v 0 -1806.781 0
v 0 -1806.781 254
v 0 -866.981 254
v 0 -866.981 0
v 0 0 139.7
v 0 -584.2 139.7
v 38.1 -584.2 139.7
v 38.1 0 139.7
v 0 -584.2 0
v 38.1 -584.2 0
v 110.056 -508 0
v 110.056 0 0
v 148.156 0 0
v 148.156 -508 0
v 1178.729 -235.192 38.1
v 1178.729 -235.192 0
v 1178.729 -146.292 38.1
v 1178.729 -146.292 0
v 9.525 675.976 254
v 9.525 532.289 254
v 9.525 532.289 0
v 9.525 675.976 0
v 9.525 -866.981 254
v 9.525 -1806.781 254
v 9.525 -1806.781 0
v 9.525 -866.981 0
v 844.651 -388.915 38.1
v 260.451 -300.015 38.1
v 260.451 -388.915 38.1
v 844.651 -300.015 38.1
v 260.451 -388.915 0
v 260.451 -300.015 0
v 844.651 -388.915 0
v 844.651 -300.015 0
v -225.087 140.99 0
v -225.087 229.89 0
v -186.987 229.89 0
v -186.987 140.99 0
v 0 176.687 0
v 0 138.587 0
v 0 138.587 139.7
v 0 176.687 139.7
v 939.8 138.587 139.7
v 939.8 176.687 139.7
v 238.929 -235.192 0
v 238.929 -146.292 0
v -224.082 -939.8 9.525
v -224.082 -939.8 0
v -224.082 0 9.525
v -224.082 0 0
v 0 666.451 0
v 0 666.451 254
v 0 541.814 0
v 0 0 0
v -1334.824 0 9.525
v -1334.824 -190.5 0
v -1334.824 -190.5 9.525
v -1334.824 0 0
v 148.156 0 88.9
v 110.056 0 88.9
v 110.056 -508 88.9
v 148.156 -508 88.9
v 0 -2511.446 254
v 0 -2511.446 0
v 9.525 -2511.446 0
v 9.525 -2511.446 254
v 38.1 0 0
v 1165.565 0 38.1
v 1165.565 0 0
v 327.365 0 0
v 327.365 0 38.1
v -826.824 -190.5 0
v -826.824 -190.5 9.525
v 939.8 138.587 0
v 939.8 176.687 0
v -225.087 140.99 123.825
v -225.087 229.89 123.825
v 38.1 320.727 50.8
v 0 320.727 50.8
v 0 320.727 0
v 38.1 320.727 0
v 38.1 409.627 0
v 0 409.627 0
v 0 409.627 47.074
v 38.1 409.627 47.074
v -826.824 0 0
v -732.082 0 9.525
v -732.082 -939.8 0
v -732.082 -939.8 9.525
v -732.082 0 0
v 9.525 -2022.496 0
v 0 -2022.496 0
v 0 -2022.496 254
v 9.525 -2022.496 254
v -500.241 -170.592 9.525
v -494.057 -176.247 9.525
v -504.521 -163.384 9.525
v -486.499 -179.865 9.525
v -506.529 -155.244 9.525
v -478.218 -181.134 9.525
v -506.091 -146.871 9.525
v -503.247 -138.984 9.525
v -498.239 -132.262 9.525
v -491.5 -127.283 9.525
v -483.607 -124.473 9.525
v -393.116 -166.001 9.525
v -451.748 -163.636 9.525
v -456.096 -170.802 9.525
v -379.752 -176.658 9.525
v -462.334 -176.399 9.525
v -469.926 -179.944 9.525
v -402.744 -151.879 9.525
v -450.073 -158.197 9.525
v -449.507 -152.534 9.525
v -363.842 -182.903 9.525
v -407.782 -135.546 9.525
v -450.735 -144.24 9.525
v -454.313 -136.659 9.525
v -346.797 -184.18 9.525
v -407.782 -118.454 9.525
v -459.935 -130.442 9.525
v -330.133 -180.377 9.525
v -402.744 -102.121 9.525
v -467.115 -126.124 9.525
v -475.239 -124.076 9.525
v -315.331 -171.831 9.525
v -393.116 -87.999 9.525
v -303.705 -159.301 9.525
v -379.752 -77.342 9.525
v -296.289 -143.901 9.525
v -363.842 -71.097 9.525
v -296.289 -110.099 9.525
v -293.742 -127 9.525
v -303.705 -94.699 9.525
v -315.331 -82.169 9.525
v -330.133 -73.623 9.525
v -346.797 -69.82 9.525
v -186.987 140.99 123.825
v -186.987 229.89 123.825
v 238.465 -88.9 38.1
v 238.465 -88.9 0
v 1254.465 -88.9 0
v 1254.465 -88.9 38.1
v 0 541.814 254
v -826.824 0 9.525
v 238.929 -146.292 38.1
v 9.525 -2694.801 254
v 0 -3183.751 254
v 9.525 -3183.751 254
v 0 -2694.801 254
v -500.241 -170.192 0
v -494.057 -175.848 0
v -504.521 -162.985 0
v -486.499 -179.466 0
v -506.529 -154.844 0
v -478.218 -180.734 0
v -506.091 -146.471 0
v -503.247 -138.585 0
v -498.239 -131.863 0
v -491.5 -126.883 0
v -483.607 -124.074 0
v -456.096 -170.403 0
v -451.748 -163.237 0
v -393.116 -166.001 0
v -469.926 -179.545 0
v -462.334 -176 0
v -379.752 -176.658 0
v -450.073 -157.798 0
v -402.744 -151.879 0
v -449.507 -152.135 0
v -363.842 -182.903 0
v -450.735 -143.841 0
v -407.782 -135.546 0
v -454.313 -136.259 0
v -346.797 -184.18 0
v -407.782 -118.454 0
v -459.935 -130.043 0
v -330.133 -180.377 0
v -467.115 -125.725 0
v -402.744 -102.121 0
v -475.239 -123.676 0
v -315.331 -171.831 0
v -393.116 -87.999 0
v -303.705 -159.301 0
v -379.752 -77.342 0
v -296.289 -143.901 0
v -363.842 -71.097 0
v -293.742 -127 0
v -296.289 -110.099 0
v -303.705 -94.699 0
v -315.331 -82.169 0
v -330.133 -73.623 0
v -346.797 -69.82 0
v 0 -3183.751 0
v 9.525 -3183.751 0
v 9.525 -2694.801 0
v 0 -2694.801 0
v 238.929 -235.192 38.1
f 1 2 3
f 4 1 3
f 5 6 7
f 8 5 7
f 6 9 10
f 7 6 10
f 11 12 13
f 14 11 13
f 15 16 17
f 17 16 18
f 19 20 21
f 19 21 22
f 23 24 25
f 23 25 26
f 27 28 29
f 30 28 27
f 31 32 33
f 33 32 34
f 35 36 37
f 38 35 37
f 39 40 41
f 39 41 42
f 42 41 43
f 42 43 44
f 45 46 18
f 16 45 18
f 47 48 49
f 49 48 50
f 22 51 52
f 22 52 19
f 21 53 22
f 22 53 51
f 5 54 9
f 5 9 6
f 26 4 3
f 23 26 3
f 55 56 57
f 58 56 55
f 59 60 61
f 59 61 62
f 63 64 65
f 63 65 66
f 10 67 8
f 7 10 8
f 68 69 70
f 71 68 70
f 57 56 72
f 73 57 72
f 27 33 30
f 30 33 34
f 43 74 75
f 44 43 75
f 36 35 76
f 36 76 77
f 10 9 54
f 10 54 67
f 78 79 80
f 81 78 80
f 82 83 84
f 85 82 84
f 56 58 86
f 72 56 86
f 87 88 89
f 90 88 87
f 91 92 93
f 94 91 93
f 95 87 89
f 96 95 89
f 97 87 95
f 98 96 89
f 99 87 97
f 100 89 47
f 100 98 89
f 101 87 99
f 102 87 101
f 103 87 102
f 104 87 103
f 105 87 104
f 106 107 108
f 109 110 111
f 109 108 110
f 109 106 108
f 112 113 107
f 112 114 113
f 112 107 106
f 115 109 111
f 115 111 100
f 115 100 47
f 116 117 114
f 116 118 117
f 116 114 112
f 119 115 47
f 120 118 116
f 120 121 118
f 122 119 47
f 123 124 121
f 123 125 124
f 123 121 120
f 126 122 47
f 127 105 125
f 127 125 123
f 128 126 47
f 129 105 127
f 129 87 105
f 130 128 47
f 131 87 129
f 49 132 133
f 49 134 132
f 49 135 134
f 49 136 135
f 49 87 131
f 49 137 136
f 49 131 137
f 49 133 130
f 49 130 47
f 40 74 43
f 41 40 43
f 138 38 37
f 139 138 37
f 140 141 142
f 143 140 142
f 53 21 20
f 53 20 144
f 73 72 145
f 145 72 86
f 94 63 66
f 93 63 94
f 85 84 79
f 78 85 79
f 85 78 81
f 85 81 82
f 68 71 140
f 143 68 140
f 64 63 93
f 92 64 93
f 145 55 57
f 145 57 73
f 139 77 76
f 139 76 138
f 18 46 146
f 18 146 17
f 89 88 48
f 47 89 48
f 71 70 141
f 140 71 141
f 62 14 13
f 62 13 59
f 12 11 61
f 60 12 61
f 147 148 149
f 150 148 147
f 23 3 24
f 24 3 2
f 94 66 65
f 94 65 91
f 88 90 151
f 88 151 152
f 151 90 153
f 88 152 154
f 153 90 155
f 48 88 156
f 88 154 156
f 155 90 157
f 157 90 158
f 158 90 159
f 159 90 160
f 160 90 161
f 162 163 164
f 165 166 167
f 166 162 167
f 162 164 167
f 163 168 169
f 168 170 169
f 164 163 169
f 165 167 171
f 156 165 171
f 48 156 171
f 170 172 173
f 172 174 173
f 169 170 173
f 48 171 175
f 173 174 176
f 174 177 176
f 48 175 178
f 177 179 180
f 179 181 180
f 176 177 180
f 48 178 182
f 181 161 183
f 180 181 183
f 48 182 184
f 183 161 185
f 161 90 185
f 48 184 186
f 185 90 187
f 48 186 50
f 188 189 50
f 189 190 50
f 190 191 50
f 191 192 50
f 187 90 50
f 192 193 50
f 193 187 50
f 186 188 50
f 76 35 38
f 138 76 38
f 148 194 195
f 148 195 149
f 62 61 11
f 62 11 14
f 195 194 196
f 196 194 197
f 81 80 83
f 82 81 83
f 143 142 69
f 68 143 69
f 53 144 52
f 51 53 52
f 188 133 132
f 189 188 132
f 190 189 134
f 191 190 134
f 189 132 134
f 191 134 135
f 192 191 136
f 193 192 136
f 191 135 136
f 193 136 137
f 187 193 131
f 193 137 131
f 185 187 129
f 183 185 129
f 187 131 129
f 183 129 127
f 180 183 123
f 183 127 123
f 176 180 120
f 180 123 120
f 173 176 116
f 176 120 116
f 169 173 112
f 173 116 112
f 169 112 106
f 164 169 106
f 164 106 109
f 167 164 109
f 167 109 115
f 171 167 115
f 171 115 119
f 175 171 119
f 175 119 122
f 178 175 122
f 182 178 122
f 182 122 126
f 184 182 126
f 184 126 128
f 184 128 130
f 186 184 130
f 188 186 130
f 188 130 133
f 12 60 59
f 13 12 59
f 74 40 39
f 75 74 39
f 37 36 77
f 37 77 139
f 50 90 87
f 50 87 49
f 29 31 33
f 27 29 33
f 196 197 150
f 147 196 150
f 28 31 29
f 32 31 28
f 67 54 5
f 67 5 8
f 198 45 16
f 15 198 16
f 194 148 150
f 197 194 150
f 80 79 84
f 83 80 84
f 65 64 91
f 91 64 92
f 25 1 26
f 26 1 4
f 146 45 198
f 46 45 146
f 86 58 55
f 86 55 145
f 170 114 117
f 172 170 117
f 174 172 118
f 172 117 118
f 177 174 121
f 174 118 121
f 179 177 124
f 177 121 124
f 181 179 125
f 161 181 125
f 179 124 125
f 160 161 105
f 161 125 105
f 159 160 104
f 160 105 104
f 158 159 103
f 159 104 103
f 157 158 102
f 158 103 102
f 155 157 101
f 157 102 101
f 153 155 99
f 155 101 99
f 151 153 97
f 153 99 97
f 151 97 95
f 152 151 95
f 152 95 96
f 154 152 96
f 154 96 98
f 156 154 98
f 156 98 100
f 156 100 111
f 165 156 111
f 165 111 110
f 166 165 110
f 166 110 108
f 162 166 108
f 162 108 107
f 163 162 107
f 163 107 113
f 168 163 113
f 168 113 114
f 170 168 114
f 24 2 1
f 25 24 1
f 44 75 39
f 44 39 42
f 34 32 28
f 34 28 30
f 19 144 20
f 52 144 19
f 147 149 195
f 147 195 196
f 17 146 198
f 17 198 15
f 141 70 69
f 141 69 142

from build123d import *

# Parameters (mm, degrees)
F0_W      = 38.1
F0_H      = 139.7
F1_DEPTH  = 584.2
F2_W      = 38.1
F2_H      = 139.7
F3_DEPTH  = 939.8
F4_W      = 38.1
F4_H      = 88.9
F5_DEPTH  = 508
F6_W      = 508
F6_H      = 939.8
F7_DEPTH  = 9.525
F8_W      = 508
F8_H      = 190.5
F9_DEPTH  = 9.525
F11_DEPTH = 9.525
F12_W     = 488.95
F12_H     = 254
F13_DEPTH = 9.525
F14_W     = 488.95
F14_H     = 254
F15_DEPTH = 9.525
F17_DEPTH = 38.1
F18_W     = 939.8
F18_H     = 88.9
F19_DEPTH = 38.1
F20_W     = 584.2
F20_H     = 88.9
F21_DEPTH = 38.1
F22_W     = 38.1
F22_H     = 88.9
F23_DEPTH = 123.825
F25_DEPTH = 38.1
F26_W     = 143.6878
F26_H     = 254
F27_DEPTH = 9.525
F29_DEPTH = 254
F31_R     = 28.575
F32_DEPTH = 76.2
F33_R     = 57.3405
F34_DEPTH = 25.4


with BuildPart() as f1:
    # F0 (on Front) → F1 (new body)
    with BuildSketch(Plane.XZ):
        with Locations((19.05, 69.85)):
            Rectangle(F0_W, F0_H)
    extrude(amount=F1_DEPTH)


with BuildPart() as f3:
    # F2 (on Right) → F3 (new body)
    with BuildSketch(Plane.YZ):
        with Locations((157.63661, 69.85)):
            Rectangle(F2_W, F2_H)
    extrude(amount=F3_DEPTH)


with BuildPart() as f5:
    # F4 (on Front) → F5 (new body)
    with BuildSketch(Plane.XZ):
        with Locations((129.106149, 44.45)):
            Rectangle(F4_W, F4_H)
    extrude(amount=F5_DEPTH)


with BuildPart() as f7:
    # F6 (on Top) → F7 (new body)
    with BuildSketch(Plane.XY):
        with Locations((-478.08211, -469.9)):
            Rectangle(F6_W, F6_H)
    extrude(amount=F7_DEPTH)

    # F31 (on face) → F32 (cut)
    with BuildSketch(Plane(origin=(0, -2.046521, 48.828516), x_dir=(1, 0, 0), z_dir=(0, -0.041876, 0.999123))):
        with Locations((-478.08211, -152.001134)):
            Circle(F31_R)
    extrude(amount=-F32_DEPTH, mode=Mode.SUBTRACT)

    # F33 (on face) → F34 (cut)
    with BuildSketch(Plane.XY.offset(9.525)):
        with Locations((-351.08211, -127)):
            Circle(F33_R)
    extrude(amount=-F34_DEPTH, mode=Mode.SUBTRACT)


with BuildPart() as f9:
    # F8 (on Top) → F9 (new body)
    with BuildSketch(Plane.XY):
        with Locations((-1080.823873, -95.25)):
            Rectangle(F8_W, F8_H)
    extrude(amount=F9_DEPTH)


with BuildPart() as f11:
    # F10 (on Right) → F11 (new body)
    with BuildSketch(Plane.YZ):
        Polygon((-1616.281064, 0), (-866.981064, 0), (-866.981064, 254), (-1806.781064, 254), (-1806.781064, 0), align=None)
    extrude(amount=F11_DEPTH)


with BuildPart() as f13:
    # F12 (on Right) → F13 (new body)
    with BuildSketch(Plane.YZ):
        with Locations((-2266.970532, 127)):
            Rectangle(F12_W, F12_H)
    extrude(amount=F13_DEPTH)


with BuildPart() as f15:
    # F14 (on Right) → F15 (new body)
    with BuildSketch(Plane.YZ):
        with Locations((-2939.276345, 127)):
            Rectangle(F14_W, F14_H)
    extrude(amount=F15_DEPTH)


with BuildPart() as f17:
    # F16 (on Top) → F17 (new body)
    with BuildSketch(Plane.XY):
        Polygon((1165.565014, 0), (327.365014, 0), (238.465014, -88.9), (1254.465014, -88.9), align=None)
    extrude(amount=F17_DEPTH)


with BuildPart() as f19:
    # F18 (on Top) → F19 (new body)
    with BuildSketch(Plane.XY):
        with Locations((708.829325, -190.742461)):
            Rectangle(F18_W, F18_H)
    extrude(amount=F19_DEPTH)


with BuildPart() as f21:
    # F20 (on Top) → F21 (new body)
    with BuildSketch(Plane.XY):
        with Locations((552.551422, -344.465377)):
            Rectangle(F20_W, F20_H)
    extrude(amount=F21_DEPTH)


with BuildPart() as f23:
    # F22 (on Top) → F23 (new body)
    with BuildSketch(Plane.XY):
        with Locations((-206.037387, 185.440167)):
            Rectangle(F22_W, F22_H)
    extrude(amount=F23_DEPTH)


with BuildPart() as f25:
    # F24 (on Right) → F25 (new body)
    with BuildSketch(Plane.YZ):
        Polygon((320.726842, 50.8), (320.726842, 0), (409.626842, 0), (409.626842, 47.073986), align=None)
    extrude(amount=F25_DEPTH)


with BuildPart() as f27:
    # F26 (on Right) → F27 (new body)
    with BuildSketch(Plane.YZ):
        with Locations((604.13243, 127)):
            Rectangle(F26_W, F26_H)
    extrude(amount=F27_DEPTH)

    # F28 (on face) → F29 (cut)
    with BuildSketch(Plane.XY.offset(254)):
        Polygon((0, 666.45133), (9.525, 675.97633), (0, 675.97633), align=None)
        Polygon((0, 532.28853), (9.525, 532.28853), (0, 541.81353), align=None)
    extrude(amount=-F29_DEPTH, mode=Mode.SUBTRACT)


solid = Compound([f1.part, f3.part, f5.part, f7.part, f9.part, f11.part, f13.part, f15.part, f17.part, f19.part, f21.part, f23.part, f25.part, f27.part])
